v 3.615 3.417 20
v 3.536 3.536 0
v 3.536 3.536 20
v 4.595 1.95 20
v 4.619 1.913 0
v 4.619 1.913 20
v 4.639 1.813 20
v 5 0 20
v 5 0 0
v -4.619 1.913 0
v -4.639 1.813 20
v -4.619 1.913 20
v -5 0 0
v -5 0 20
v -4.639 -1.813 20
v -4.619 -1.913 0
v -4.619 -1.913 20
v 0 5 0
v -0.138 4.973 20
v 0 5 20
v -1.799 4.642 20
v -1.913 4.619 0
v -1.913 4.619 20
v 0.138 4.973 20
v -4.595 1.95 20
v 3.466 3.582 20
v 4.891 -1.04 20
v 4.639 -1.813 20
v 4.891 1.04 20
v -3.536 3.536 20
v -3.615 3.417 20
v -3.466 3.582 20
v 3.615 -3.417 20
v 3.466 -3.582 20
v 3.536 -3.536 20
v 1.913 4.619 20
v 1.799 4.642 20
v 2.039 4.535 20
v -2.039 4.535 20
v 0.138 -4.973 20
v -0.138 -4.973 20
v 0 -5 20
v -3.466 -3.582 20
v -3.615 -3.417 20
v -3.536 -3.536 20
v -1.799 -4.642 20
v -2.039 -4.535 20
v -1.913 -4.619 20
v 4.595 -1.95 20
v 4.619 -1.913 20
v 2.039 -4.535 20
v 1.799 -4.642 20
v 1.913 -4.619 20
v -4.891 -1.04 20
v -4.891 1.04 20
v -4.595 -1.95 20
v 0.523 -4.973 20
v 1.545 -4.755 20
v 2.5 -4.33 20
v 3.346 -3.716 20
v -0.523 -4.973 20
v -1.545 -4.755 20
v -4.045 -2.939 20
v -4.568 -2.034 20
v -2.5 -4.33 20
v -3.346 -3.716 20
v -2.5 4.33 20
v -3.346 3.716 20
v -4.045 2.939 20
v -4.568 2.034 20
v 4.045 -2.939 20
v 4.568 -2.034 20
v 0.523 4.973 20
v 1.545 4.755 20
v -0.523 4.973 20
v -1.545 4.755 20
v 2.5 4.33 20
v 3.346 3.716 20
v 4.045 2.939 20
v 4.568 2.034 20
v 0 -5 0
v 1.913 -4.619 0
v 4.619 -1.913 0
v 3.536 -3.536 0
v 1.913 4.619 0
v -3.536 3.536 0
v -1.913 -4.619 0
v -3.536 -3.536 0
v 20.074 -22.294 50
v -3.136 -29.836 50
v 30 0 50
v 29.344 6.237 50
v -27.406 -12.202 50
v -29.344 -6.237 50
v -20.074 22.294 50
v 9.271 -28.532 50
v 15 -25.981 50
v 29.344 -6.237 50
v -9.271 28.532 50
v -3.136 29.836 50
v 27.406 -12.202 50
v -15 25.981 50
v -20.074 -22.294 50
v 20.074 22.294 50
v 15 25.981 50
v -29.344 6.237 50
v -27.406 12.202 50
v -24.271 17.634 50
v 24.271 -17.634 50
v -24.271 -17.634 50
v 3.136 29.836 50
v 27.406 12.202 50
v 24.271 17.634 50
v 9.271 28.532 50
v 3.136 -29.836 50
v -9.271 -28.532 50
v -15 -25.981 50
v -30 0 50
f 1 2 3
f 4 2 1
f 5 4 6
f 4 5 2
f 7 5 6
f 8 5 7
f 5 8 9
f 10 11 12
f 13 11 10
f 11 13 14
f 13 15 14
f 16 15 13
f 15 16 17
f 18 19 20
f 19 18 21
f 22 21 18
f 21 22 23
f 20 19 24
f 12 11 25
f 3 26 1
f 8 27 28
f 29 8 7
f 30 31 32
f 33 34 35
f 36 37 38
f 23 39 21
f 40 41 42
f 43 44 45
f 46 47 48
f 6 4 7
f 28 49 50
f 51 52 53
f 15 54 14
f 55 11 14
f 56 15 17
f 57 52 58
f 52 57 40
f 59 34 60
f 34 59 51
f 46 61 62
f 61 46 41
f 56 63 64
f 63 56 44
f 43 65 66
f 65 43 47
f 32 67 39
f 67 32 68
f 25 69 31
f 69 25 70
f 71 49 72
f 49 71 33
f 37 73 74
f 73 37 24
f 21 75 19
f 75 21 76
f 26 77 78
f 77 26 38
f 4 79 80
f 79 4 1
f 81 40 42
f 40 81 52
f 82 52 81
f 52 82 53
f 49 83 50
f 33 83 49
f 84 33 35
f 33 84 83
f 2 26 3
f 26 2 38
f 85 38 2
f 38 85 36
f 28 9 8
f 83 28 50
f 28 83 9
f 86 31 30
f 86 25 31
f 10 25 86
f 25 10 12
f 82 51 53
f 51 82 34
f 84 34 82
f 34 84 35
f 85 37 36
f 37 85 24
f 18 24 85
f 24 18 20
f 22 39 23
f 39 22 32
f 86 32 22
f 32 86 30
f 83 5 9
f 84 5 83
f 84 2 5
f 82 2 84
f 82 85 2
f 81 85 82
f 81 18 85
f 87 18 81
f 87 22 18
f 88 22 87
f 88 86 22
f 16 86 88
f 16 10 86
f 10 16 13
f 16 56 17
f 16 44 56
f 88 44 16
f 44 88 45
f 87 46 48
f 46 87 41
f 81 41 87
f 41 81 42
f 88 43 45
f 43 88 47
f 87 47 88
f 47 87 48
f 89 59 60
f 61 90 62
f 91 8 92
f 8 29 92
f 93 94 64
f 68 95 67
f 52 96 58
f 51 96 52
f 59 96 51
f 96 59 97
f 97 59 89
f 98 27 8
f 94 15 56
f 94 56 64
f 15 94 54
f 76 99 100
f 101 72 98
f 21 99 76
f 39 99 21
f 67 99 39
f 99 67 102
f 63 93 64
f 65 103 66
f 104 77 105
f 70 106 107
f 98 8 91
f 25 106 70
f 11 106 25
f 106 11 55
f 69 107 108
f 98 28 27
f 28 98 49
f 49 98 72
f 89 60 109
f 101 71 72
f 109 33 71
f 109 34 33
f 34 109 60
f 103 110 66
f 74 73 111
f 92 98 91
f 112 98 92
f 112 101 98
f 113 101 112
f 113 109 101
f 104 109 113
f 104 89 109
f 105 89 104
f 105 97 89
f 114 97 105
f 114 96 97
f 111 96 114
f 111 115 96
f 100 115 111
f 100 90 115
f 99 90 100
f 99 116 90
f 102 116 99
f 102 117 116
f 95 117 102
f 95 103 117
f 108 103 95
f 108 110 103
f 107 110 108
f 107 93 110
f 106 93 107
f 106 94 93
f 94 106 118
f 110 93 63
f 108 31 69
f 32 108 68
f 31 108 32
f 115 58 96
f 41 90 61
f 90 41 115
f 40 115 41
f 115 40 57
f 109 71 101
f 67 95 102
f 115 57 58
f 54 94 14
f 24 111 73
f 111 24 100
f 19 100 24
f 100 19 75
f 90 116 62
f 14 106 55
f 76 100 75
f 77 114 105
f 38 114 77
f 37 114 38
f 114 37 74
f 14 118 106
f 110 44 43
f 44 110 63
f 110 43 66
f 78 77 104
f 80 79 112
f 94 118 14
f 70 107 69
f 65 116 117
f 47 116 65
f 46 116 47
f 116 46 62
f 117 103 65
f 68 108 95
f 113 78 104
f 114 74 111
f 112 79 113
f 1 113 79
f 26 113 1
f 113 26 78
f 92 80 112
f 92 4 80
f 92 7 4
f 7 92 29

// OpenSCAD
// Lab Funnel Design
// Units: millimetres
// Print orientation: Upright (XY plane at z=0, builds +Z)
// Centered on origin in X and Y.

// --- Dimensions ---
// Spout dimensions
spout_od = 10.0;       // Outer diameter of the straight spout
spout_height = 20.0;    // Height of the straight spout section
spout_thickness = 1.6; // Wall thickness
spout_id = spout_od - 2 * spout_thickness; // Inner diameter of spout

// Funnel (Cone) dimensions
funnel_height = 30.0;   // Height of the cone section (from z=20 to z=50)
funnel_rim_od = 60.0;   // Outer diameter at the top rim
funnel_rim_id = funnel_rim_od - 2 * spout_thickness; // Inner diameter at rim

// --- Calculated Values ---
// Radii
spout_r = spout_od / 2;
spout_inner_r = spout_id / 2;
funnel_rim_r = funnel_rim_od / 2;
funnel_rim_inner_r = funnel_rim_id / 2;

// Total height
total_height = spout_height + funnel_height;

// --- Construction ---
// We build the outer shape and subtract the inner void.
// The outer shape consists of a cylinder (spout) and a cone (funnel).
// The inner shape consists of a cylinder (spout bore) and a cone (funnel bore).

module outer_shape() {
    // 1. Straight Spout (Cylinder)
    // Extends from z=0 to z=20
    cylinder(h = spout_height, r = spout_r, center = false);
    
    // 2. Funnel Cone (Cone)
    // Extends from z=20 to z=50.
    // Bottom radius = spout_r, Top radius = funnel_rim_r.
    // We use a cylinder with different top and bottom radii (cone).
    // Note: OpenSCAD cylinder with r1 != r2 creates a cone.
    // We need to position the base at z=20.
    translate([0, 0, spout_height]) {
        cylinder(h = funnel_height, r1 = spout_r, r2 = funnel_rim_r, center = false);
    }
}

module inner_shape() {
    // 1. Straight Spout Bore (Cylinder)
    // Extends from z=0 to z=20
    cylinder(h = spout_height, r = spout_inner_r, center = false);
    
    // 2. Funnel Bore (Cone)
    // Extends from z=20 to z=50.
    // Bottom radius = spout_inner_r, Top radius = funnel_rim_inner_r.
    translate([0, 0, spout_height]) {
        cylinder(h = funnel_height, r1 = spout_inner_r, r2 = funnel_rim_inner_r, center = false);
    }
}

// Final Part: Outer shape minus Inner shape
// Ensure the inner shape extends slightly past the faces to avoid coplanar issues.
// We add a small epsilon to the height of the inner shape to ensure it cuts through.
epsilon = 0.01;

union() {
    // Create the solid outer shell
    outer_shape();
    
    // Subtract the inner void
    // We use a slightly taller inner shape to ensure the cut goes through the top rim
    // and bottom spout tip cleanly.
    difference() {
        // The outer shape is the base
        outer_shape();
        
        // The inner void
        // We shift the inner shape slightly to ensure it cuts the top face of the cone
        // and the bottom face of the spout.
        // Actually, for a hollow part, we just subtract the inner volume.
        // To ensure no coplanar faces at the very top rim, we make the inner cone
        // slightly taller than the outer cone, or the outer cone slightly shorter.
        // The rule says "make every cutting shape extend 0.01-1 mm past the faces".
        // So we extend the inner shape slightly beyond the outer shape's top and bottom.
        
        translate([0, 0, -epsilon]) {
            inner_shape();
        }
    }
}

// Render the final part
difference() {
    outer_shape();
    // Extend the inner cut slightly to ensure clean topology
    translate([0, 0, -epsilon]) {
        inner_shape();
    }
}
